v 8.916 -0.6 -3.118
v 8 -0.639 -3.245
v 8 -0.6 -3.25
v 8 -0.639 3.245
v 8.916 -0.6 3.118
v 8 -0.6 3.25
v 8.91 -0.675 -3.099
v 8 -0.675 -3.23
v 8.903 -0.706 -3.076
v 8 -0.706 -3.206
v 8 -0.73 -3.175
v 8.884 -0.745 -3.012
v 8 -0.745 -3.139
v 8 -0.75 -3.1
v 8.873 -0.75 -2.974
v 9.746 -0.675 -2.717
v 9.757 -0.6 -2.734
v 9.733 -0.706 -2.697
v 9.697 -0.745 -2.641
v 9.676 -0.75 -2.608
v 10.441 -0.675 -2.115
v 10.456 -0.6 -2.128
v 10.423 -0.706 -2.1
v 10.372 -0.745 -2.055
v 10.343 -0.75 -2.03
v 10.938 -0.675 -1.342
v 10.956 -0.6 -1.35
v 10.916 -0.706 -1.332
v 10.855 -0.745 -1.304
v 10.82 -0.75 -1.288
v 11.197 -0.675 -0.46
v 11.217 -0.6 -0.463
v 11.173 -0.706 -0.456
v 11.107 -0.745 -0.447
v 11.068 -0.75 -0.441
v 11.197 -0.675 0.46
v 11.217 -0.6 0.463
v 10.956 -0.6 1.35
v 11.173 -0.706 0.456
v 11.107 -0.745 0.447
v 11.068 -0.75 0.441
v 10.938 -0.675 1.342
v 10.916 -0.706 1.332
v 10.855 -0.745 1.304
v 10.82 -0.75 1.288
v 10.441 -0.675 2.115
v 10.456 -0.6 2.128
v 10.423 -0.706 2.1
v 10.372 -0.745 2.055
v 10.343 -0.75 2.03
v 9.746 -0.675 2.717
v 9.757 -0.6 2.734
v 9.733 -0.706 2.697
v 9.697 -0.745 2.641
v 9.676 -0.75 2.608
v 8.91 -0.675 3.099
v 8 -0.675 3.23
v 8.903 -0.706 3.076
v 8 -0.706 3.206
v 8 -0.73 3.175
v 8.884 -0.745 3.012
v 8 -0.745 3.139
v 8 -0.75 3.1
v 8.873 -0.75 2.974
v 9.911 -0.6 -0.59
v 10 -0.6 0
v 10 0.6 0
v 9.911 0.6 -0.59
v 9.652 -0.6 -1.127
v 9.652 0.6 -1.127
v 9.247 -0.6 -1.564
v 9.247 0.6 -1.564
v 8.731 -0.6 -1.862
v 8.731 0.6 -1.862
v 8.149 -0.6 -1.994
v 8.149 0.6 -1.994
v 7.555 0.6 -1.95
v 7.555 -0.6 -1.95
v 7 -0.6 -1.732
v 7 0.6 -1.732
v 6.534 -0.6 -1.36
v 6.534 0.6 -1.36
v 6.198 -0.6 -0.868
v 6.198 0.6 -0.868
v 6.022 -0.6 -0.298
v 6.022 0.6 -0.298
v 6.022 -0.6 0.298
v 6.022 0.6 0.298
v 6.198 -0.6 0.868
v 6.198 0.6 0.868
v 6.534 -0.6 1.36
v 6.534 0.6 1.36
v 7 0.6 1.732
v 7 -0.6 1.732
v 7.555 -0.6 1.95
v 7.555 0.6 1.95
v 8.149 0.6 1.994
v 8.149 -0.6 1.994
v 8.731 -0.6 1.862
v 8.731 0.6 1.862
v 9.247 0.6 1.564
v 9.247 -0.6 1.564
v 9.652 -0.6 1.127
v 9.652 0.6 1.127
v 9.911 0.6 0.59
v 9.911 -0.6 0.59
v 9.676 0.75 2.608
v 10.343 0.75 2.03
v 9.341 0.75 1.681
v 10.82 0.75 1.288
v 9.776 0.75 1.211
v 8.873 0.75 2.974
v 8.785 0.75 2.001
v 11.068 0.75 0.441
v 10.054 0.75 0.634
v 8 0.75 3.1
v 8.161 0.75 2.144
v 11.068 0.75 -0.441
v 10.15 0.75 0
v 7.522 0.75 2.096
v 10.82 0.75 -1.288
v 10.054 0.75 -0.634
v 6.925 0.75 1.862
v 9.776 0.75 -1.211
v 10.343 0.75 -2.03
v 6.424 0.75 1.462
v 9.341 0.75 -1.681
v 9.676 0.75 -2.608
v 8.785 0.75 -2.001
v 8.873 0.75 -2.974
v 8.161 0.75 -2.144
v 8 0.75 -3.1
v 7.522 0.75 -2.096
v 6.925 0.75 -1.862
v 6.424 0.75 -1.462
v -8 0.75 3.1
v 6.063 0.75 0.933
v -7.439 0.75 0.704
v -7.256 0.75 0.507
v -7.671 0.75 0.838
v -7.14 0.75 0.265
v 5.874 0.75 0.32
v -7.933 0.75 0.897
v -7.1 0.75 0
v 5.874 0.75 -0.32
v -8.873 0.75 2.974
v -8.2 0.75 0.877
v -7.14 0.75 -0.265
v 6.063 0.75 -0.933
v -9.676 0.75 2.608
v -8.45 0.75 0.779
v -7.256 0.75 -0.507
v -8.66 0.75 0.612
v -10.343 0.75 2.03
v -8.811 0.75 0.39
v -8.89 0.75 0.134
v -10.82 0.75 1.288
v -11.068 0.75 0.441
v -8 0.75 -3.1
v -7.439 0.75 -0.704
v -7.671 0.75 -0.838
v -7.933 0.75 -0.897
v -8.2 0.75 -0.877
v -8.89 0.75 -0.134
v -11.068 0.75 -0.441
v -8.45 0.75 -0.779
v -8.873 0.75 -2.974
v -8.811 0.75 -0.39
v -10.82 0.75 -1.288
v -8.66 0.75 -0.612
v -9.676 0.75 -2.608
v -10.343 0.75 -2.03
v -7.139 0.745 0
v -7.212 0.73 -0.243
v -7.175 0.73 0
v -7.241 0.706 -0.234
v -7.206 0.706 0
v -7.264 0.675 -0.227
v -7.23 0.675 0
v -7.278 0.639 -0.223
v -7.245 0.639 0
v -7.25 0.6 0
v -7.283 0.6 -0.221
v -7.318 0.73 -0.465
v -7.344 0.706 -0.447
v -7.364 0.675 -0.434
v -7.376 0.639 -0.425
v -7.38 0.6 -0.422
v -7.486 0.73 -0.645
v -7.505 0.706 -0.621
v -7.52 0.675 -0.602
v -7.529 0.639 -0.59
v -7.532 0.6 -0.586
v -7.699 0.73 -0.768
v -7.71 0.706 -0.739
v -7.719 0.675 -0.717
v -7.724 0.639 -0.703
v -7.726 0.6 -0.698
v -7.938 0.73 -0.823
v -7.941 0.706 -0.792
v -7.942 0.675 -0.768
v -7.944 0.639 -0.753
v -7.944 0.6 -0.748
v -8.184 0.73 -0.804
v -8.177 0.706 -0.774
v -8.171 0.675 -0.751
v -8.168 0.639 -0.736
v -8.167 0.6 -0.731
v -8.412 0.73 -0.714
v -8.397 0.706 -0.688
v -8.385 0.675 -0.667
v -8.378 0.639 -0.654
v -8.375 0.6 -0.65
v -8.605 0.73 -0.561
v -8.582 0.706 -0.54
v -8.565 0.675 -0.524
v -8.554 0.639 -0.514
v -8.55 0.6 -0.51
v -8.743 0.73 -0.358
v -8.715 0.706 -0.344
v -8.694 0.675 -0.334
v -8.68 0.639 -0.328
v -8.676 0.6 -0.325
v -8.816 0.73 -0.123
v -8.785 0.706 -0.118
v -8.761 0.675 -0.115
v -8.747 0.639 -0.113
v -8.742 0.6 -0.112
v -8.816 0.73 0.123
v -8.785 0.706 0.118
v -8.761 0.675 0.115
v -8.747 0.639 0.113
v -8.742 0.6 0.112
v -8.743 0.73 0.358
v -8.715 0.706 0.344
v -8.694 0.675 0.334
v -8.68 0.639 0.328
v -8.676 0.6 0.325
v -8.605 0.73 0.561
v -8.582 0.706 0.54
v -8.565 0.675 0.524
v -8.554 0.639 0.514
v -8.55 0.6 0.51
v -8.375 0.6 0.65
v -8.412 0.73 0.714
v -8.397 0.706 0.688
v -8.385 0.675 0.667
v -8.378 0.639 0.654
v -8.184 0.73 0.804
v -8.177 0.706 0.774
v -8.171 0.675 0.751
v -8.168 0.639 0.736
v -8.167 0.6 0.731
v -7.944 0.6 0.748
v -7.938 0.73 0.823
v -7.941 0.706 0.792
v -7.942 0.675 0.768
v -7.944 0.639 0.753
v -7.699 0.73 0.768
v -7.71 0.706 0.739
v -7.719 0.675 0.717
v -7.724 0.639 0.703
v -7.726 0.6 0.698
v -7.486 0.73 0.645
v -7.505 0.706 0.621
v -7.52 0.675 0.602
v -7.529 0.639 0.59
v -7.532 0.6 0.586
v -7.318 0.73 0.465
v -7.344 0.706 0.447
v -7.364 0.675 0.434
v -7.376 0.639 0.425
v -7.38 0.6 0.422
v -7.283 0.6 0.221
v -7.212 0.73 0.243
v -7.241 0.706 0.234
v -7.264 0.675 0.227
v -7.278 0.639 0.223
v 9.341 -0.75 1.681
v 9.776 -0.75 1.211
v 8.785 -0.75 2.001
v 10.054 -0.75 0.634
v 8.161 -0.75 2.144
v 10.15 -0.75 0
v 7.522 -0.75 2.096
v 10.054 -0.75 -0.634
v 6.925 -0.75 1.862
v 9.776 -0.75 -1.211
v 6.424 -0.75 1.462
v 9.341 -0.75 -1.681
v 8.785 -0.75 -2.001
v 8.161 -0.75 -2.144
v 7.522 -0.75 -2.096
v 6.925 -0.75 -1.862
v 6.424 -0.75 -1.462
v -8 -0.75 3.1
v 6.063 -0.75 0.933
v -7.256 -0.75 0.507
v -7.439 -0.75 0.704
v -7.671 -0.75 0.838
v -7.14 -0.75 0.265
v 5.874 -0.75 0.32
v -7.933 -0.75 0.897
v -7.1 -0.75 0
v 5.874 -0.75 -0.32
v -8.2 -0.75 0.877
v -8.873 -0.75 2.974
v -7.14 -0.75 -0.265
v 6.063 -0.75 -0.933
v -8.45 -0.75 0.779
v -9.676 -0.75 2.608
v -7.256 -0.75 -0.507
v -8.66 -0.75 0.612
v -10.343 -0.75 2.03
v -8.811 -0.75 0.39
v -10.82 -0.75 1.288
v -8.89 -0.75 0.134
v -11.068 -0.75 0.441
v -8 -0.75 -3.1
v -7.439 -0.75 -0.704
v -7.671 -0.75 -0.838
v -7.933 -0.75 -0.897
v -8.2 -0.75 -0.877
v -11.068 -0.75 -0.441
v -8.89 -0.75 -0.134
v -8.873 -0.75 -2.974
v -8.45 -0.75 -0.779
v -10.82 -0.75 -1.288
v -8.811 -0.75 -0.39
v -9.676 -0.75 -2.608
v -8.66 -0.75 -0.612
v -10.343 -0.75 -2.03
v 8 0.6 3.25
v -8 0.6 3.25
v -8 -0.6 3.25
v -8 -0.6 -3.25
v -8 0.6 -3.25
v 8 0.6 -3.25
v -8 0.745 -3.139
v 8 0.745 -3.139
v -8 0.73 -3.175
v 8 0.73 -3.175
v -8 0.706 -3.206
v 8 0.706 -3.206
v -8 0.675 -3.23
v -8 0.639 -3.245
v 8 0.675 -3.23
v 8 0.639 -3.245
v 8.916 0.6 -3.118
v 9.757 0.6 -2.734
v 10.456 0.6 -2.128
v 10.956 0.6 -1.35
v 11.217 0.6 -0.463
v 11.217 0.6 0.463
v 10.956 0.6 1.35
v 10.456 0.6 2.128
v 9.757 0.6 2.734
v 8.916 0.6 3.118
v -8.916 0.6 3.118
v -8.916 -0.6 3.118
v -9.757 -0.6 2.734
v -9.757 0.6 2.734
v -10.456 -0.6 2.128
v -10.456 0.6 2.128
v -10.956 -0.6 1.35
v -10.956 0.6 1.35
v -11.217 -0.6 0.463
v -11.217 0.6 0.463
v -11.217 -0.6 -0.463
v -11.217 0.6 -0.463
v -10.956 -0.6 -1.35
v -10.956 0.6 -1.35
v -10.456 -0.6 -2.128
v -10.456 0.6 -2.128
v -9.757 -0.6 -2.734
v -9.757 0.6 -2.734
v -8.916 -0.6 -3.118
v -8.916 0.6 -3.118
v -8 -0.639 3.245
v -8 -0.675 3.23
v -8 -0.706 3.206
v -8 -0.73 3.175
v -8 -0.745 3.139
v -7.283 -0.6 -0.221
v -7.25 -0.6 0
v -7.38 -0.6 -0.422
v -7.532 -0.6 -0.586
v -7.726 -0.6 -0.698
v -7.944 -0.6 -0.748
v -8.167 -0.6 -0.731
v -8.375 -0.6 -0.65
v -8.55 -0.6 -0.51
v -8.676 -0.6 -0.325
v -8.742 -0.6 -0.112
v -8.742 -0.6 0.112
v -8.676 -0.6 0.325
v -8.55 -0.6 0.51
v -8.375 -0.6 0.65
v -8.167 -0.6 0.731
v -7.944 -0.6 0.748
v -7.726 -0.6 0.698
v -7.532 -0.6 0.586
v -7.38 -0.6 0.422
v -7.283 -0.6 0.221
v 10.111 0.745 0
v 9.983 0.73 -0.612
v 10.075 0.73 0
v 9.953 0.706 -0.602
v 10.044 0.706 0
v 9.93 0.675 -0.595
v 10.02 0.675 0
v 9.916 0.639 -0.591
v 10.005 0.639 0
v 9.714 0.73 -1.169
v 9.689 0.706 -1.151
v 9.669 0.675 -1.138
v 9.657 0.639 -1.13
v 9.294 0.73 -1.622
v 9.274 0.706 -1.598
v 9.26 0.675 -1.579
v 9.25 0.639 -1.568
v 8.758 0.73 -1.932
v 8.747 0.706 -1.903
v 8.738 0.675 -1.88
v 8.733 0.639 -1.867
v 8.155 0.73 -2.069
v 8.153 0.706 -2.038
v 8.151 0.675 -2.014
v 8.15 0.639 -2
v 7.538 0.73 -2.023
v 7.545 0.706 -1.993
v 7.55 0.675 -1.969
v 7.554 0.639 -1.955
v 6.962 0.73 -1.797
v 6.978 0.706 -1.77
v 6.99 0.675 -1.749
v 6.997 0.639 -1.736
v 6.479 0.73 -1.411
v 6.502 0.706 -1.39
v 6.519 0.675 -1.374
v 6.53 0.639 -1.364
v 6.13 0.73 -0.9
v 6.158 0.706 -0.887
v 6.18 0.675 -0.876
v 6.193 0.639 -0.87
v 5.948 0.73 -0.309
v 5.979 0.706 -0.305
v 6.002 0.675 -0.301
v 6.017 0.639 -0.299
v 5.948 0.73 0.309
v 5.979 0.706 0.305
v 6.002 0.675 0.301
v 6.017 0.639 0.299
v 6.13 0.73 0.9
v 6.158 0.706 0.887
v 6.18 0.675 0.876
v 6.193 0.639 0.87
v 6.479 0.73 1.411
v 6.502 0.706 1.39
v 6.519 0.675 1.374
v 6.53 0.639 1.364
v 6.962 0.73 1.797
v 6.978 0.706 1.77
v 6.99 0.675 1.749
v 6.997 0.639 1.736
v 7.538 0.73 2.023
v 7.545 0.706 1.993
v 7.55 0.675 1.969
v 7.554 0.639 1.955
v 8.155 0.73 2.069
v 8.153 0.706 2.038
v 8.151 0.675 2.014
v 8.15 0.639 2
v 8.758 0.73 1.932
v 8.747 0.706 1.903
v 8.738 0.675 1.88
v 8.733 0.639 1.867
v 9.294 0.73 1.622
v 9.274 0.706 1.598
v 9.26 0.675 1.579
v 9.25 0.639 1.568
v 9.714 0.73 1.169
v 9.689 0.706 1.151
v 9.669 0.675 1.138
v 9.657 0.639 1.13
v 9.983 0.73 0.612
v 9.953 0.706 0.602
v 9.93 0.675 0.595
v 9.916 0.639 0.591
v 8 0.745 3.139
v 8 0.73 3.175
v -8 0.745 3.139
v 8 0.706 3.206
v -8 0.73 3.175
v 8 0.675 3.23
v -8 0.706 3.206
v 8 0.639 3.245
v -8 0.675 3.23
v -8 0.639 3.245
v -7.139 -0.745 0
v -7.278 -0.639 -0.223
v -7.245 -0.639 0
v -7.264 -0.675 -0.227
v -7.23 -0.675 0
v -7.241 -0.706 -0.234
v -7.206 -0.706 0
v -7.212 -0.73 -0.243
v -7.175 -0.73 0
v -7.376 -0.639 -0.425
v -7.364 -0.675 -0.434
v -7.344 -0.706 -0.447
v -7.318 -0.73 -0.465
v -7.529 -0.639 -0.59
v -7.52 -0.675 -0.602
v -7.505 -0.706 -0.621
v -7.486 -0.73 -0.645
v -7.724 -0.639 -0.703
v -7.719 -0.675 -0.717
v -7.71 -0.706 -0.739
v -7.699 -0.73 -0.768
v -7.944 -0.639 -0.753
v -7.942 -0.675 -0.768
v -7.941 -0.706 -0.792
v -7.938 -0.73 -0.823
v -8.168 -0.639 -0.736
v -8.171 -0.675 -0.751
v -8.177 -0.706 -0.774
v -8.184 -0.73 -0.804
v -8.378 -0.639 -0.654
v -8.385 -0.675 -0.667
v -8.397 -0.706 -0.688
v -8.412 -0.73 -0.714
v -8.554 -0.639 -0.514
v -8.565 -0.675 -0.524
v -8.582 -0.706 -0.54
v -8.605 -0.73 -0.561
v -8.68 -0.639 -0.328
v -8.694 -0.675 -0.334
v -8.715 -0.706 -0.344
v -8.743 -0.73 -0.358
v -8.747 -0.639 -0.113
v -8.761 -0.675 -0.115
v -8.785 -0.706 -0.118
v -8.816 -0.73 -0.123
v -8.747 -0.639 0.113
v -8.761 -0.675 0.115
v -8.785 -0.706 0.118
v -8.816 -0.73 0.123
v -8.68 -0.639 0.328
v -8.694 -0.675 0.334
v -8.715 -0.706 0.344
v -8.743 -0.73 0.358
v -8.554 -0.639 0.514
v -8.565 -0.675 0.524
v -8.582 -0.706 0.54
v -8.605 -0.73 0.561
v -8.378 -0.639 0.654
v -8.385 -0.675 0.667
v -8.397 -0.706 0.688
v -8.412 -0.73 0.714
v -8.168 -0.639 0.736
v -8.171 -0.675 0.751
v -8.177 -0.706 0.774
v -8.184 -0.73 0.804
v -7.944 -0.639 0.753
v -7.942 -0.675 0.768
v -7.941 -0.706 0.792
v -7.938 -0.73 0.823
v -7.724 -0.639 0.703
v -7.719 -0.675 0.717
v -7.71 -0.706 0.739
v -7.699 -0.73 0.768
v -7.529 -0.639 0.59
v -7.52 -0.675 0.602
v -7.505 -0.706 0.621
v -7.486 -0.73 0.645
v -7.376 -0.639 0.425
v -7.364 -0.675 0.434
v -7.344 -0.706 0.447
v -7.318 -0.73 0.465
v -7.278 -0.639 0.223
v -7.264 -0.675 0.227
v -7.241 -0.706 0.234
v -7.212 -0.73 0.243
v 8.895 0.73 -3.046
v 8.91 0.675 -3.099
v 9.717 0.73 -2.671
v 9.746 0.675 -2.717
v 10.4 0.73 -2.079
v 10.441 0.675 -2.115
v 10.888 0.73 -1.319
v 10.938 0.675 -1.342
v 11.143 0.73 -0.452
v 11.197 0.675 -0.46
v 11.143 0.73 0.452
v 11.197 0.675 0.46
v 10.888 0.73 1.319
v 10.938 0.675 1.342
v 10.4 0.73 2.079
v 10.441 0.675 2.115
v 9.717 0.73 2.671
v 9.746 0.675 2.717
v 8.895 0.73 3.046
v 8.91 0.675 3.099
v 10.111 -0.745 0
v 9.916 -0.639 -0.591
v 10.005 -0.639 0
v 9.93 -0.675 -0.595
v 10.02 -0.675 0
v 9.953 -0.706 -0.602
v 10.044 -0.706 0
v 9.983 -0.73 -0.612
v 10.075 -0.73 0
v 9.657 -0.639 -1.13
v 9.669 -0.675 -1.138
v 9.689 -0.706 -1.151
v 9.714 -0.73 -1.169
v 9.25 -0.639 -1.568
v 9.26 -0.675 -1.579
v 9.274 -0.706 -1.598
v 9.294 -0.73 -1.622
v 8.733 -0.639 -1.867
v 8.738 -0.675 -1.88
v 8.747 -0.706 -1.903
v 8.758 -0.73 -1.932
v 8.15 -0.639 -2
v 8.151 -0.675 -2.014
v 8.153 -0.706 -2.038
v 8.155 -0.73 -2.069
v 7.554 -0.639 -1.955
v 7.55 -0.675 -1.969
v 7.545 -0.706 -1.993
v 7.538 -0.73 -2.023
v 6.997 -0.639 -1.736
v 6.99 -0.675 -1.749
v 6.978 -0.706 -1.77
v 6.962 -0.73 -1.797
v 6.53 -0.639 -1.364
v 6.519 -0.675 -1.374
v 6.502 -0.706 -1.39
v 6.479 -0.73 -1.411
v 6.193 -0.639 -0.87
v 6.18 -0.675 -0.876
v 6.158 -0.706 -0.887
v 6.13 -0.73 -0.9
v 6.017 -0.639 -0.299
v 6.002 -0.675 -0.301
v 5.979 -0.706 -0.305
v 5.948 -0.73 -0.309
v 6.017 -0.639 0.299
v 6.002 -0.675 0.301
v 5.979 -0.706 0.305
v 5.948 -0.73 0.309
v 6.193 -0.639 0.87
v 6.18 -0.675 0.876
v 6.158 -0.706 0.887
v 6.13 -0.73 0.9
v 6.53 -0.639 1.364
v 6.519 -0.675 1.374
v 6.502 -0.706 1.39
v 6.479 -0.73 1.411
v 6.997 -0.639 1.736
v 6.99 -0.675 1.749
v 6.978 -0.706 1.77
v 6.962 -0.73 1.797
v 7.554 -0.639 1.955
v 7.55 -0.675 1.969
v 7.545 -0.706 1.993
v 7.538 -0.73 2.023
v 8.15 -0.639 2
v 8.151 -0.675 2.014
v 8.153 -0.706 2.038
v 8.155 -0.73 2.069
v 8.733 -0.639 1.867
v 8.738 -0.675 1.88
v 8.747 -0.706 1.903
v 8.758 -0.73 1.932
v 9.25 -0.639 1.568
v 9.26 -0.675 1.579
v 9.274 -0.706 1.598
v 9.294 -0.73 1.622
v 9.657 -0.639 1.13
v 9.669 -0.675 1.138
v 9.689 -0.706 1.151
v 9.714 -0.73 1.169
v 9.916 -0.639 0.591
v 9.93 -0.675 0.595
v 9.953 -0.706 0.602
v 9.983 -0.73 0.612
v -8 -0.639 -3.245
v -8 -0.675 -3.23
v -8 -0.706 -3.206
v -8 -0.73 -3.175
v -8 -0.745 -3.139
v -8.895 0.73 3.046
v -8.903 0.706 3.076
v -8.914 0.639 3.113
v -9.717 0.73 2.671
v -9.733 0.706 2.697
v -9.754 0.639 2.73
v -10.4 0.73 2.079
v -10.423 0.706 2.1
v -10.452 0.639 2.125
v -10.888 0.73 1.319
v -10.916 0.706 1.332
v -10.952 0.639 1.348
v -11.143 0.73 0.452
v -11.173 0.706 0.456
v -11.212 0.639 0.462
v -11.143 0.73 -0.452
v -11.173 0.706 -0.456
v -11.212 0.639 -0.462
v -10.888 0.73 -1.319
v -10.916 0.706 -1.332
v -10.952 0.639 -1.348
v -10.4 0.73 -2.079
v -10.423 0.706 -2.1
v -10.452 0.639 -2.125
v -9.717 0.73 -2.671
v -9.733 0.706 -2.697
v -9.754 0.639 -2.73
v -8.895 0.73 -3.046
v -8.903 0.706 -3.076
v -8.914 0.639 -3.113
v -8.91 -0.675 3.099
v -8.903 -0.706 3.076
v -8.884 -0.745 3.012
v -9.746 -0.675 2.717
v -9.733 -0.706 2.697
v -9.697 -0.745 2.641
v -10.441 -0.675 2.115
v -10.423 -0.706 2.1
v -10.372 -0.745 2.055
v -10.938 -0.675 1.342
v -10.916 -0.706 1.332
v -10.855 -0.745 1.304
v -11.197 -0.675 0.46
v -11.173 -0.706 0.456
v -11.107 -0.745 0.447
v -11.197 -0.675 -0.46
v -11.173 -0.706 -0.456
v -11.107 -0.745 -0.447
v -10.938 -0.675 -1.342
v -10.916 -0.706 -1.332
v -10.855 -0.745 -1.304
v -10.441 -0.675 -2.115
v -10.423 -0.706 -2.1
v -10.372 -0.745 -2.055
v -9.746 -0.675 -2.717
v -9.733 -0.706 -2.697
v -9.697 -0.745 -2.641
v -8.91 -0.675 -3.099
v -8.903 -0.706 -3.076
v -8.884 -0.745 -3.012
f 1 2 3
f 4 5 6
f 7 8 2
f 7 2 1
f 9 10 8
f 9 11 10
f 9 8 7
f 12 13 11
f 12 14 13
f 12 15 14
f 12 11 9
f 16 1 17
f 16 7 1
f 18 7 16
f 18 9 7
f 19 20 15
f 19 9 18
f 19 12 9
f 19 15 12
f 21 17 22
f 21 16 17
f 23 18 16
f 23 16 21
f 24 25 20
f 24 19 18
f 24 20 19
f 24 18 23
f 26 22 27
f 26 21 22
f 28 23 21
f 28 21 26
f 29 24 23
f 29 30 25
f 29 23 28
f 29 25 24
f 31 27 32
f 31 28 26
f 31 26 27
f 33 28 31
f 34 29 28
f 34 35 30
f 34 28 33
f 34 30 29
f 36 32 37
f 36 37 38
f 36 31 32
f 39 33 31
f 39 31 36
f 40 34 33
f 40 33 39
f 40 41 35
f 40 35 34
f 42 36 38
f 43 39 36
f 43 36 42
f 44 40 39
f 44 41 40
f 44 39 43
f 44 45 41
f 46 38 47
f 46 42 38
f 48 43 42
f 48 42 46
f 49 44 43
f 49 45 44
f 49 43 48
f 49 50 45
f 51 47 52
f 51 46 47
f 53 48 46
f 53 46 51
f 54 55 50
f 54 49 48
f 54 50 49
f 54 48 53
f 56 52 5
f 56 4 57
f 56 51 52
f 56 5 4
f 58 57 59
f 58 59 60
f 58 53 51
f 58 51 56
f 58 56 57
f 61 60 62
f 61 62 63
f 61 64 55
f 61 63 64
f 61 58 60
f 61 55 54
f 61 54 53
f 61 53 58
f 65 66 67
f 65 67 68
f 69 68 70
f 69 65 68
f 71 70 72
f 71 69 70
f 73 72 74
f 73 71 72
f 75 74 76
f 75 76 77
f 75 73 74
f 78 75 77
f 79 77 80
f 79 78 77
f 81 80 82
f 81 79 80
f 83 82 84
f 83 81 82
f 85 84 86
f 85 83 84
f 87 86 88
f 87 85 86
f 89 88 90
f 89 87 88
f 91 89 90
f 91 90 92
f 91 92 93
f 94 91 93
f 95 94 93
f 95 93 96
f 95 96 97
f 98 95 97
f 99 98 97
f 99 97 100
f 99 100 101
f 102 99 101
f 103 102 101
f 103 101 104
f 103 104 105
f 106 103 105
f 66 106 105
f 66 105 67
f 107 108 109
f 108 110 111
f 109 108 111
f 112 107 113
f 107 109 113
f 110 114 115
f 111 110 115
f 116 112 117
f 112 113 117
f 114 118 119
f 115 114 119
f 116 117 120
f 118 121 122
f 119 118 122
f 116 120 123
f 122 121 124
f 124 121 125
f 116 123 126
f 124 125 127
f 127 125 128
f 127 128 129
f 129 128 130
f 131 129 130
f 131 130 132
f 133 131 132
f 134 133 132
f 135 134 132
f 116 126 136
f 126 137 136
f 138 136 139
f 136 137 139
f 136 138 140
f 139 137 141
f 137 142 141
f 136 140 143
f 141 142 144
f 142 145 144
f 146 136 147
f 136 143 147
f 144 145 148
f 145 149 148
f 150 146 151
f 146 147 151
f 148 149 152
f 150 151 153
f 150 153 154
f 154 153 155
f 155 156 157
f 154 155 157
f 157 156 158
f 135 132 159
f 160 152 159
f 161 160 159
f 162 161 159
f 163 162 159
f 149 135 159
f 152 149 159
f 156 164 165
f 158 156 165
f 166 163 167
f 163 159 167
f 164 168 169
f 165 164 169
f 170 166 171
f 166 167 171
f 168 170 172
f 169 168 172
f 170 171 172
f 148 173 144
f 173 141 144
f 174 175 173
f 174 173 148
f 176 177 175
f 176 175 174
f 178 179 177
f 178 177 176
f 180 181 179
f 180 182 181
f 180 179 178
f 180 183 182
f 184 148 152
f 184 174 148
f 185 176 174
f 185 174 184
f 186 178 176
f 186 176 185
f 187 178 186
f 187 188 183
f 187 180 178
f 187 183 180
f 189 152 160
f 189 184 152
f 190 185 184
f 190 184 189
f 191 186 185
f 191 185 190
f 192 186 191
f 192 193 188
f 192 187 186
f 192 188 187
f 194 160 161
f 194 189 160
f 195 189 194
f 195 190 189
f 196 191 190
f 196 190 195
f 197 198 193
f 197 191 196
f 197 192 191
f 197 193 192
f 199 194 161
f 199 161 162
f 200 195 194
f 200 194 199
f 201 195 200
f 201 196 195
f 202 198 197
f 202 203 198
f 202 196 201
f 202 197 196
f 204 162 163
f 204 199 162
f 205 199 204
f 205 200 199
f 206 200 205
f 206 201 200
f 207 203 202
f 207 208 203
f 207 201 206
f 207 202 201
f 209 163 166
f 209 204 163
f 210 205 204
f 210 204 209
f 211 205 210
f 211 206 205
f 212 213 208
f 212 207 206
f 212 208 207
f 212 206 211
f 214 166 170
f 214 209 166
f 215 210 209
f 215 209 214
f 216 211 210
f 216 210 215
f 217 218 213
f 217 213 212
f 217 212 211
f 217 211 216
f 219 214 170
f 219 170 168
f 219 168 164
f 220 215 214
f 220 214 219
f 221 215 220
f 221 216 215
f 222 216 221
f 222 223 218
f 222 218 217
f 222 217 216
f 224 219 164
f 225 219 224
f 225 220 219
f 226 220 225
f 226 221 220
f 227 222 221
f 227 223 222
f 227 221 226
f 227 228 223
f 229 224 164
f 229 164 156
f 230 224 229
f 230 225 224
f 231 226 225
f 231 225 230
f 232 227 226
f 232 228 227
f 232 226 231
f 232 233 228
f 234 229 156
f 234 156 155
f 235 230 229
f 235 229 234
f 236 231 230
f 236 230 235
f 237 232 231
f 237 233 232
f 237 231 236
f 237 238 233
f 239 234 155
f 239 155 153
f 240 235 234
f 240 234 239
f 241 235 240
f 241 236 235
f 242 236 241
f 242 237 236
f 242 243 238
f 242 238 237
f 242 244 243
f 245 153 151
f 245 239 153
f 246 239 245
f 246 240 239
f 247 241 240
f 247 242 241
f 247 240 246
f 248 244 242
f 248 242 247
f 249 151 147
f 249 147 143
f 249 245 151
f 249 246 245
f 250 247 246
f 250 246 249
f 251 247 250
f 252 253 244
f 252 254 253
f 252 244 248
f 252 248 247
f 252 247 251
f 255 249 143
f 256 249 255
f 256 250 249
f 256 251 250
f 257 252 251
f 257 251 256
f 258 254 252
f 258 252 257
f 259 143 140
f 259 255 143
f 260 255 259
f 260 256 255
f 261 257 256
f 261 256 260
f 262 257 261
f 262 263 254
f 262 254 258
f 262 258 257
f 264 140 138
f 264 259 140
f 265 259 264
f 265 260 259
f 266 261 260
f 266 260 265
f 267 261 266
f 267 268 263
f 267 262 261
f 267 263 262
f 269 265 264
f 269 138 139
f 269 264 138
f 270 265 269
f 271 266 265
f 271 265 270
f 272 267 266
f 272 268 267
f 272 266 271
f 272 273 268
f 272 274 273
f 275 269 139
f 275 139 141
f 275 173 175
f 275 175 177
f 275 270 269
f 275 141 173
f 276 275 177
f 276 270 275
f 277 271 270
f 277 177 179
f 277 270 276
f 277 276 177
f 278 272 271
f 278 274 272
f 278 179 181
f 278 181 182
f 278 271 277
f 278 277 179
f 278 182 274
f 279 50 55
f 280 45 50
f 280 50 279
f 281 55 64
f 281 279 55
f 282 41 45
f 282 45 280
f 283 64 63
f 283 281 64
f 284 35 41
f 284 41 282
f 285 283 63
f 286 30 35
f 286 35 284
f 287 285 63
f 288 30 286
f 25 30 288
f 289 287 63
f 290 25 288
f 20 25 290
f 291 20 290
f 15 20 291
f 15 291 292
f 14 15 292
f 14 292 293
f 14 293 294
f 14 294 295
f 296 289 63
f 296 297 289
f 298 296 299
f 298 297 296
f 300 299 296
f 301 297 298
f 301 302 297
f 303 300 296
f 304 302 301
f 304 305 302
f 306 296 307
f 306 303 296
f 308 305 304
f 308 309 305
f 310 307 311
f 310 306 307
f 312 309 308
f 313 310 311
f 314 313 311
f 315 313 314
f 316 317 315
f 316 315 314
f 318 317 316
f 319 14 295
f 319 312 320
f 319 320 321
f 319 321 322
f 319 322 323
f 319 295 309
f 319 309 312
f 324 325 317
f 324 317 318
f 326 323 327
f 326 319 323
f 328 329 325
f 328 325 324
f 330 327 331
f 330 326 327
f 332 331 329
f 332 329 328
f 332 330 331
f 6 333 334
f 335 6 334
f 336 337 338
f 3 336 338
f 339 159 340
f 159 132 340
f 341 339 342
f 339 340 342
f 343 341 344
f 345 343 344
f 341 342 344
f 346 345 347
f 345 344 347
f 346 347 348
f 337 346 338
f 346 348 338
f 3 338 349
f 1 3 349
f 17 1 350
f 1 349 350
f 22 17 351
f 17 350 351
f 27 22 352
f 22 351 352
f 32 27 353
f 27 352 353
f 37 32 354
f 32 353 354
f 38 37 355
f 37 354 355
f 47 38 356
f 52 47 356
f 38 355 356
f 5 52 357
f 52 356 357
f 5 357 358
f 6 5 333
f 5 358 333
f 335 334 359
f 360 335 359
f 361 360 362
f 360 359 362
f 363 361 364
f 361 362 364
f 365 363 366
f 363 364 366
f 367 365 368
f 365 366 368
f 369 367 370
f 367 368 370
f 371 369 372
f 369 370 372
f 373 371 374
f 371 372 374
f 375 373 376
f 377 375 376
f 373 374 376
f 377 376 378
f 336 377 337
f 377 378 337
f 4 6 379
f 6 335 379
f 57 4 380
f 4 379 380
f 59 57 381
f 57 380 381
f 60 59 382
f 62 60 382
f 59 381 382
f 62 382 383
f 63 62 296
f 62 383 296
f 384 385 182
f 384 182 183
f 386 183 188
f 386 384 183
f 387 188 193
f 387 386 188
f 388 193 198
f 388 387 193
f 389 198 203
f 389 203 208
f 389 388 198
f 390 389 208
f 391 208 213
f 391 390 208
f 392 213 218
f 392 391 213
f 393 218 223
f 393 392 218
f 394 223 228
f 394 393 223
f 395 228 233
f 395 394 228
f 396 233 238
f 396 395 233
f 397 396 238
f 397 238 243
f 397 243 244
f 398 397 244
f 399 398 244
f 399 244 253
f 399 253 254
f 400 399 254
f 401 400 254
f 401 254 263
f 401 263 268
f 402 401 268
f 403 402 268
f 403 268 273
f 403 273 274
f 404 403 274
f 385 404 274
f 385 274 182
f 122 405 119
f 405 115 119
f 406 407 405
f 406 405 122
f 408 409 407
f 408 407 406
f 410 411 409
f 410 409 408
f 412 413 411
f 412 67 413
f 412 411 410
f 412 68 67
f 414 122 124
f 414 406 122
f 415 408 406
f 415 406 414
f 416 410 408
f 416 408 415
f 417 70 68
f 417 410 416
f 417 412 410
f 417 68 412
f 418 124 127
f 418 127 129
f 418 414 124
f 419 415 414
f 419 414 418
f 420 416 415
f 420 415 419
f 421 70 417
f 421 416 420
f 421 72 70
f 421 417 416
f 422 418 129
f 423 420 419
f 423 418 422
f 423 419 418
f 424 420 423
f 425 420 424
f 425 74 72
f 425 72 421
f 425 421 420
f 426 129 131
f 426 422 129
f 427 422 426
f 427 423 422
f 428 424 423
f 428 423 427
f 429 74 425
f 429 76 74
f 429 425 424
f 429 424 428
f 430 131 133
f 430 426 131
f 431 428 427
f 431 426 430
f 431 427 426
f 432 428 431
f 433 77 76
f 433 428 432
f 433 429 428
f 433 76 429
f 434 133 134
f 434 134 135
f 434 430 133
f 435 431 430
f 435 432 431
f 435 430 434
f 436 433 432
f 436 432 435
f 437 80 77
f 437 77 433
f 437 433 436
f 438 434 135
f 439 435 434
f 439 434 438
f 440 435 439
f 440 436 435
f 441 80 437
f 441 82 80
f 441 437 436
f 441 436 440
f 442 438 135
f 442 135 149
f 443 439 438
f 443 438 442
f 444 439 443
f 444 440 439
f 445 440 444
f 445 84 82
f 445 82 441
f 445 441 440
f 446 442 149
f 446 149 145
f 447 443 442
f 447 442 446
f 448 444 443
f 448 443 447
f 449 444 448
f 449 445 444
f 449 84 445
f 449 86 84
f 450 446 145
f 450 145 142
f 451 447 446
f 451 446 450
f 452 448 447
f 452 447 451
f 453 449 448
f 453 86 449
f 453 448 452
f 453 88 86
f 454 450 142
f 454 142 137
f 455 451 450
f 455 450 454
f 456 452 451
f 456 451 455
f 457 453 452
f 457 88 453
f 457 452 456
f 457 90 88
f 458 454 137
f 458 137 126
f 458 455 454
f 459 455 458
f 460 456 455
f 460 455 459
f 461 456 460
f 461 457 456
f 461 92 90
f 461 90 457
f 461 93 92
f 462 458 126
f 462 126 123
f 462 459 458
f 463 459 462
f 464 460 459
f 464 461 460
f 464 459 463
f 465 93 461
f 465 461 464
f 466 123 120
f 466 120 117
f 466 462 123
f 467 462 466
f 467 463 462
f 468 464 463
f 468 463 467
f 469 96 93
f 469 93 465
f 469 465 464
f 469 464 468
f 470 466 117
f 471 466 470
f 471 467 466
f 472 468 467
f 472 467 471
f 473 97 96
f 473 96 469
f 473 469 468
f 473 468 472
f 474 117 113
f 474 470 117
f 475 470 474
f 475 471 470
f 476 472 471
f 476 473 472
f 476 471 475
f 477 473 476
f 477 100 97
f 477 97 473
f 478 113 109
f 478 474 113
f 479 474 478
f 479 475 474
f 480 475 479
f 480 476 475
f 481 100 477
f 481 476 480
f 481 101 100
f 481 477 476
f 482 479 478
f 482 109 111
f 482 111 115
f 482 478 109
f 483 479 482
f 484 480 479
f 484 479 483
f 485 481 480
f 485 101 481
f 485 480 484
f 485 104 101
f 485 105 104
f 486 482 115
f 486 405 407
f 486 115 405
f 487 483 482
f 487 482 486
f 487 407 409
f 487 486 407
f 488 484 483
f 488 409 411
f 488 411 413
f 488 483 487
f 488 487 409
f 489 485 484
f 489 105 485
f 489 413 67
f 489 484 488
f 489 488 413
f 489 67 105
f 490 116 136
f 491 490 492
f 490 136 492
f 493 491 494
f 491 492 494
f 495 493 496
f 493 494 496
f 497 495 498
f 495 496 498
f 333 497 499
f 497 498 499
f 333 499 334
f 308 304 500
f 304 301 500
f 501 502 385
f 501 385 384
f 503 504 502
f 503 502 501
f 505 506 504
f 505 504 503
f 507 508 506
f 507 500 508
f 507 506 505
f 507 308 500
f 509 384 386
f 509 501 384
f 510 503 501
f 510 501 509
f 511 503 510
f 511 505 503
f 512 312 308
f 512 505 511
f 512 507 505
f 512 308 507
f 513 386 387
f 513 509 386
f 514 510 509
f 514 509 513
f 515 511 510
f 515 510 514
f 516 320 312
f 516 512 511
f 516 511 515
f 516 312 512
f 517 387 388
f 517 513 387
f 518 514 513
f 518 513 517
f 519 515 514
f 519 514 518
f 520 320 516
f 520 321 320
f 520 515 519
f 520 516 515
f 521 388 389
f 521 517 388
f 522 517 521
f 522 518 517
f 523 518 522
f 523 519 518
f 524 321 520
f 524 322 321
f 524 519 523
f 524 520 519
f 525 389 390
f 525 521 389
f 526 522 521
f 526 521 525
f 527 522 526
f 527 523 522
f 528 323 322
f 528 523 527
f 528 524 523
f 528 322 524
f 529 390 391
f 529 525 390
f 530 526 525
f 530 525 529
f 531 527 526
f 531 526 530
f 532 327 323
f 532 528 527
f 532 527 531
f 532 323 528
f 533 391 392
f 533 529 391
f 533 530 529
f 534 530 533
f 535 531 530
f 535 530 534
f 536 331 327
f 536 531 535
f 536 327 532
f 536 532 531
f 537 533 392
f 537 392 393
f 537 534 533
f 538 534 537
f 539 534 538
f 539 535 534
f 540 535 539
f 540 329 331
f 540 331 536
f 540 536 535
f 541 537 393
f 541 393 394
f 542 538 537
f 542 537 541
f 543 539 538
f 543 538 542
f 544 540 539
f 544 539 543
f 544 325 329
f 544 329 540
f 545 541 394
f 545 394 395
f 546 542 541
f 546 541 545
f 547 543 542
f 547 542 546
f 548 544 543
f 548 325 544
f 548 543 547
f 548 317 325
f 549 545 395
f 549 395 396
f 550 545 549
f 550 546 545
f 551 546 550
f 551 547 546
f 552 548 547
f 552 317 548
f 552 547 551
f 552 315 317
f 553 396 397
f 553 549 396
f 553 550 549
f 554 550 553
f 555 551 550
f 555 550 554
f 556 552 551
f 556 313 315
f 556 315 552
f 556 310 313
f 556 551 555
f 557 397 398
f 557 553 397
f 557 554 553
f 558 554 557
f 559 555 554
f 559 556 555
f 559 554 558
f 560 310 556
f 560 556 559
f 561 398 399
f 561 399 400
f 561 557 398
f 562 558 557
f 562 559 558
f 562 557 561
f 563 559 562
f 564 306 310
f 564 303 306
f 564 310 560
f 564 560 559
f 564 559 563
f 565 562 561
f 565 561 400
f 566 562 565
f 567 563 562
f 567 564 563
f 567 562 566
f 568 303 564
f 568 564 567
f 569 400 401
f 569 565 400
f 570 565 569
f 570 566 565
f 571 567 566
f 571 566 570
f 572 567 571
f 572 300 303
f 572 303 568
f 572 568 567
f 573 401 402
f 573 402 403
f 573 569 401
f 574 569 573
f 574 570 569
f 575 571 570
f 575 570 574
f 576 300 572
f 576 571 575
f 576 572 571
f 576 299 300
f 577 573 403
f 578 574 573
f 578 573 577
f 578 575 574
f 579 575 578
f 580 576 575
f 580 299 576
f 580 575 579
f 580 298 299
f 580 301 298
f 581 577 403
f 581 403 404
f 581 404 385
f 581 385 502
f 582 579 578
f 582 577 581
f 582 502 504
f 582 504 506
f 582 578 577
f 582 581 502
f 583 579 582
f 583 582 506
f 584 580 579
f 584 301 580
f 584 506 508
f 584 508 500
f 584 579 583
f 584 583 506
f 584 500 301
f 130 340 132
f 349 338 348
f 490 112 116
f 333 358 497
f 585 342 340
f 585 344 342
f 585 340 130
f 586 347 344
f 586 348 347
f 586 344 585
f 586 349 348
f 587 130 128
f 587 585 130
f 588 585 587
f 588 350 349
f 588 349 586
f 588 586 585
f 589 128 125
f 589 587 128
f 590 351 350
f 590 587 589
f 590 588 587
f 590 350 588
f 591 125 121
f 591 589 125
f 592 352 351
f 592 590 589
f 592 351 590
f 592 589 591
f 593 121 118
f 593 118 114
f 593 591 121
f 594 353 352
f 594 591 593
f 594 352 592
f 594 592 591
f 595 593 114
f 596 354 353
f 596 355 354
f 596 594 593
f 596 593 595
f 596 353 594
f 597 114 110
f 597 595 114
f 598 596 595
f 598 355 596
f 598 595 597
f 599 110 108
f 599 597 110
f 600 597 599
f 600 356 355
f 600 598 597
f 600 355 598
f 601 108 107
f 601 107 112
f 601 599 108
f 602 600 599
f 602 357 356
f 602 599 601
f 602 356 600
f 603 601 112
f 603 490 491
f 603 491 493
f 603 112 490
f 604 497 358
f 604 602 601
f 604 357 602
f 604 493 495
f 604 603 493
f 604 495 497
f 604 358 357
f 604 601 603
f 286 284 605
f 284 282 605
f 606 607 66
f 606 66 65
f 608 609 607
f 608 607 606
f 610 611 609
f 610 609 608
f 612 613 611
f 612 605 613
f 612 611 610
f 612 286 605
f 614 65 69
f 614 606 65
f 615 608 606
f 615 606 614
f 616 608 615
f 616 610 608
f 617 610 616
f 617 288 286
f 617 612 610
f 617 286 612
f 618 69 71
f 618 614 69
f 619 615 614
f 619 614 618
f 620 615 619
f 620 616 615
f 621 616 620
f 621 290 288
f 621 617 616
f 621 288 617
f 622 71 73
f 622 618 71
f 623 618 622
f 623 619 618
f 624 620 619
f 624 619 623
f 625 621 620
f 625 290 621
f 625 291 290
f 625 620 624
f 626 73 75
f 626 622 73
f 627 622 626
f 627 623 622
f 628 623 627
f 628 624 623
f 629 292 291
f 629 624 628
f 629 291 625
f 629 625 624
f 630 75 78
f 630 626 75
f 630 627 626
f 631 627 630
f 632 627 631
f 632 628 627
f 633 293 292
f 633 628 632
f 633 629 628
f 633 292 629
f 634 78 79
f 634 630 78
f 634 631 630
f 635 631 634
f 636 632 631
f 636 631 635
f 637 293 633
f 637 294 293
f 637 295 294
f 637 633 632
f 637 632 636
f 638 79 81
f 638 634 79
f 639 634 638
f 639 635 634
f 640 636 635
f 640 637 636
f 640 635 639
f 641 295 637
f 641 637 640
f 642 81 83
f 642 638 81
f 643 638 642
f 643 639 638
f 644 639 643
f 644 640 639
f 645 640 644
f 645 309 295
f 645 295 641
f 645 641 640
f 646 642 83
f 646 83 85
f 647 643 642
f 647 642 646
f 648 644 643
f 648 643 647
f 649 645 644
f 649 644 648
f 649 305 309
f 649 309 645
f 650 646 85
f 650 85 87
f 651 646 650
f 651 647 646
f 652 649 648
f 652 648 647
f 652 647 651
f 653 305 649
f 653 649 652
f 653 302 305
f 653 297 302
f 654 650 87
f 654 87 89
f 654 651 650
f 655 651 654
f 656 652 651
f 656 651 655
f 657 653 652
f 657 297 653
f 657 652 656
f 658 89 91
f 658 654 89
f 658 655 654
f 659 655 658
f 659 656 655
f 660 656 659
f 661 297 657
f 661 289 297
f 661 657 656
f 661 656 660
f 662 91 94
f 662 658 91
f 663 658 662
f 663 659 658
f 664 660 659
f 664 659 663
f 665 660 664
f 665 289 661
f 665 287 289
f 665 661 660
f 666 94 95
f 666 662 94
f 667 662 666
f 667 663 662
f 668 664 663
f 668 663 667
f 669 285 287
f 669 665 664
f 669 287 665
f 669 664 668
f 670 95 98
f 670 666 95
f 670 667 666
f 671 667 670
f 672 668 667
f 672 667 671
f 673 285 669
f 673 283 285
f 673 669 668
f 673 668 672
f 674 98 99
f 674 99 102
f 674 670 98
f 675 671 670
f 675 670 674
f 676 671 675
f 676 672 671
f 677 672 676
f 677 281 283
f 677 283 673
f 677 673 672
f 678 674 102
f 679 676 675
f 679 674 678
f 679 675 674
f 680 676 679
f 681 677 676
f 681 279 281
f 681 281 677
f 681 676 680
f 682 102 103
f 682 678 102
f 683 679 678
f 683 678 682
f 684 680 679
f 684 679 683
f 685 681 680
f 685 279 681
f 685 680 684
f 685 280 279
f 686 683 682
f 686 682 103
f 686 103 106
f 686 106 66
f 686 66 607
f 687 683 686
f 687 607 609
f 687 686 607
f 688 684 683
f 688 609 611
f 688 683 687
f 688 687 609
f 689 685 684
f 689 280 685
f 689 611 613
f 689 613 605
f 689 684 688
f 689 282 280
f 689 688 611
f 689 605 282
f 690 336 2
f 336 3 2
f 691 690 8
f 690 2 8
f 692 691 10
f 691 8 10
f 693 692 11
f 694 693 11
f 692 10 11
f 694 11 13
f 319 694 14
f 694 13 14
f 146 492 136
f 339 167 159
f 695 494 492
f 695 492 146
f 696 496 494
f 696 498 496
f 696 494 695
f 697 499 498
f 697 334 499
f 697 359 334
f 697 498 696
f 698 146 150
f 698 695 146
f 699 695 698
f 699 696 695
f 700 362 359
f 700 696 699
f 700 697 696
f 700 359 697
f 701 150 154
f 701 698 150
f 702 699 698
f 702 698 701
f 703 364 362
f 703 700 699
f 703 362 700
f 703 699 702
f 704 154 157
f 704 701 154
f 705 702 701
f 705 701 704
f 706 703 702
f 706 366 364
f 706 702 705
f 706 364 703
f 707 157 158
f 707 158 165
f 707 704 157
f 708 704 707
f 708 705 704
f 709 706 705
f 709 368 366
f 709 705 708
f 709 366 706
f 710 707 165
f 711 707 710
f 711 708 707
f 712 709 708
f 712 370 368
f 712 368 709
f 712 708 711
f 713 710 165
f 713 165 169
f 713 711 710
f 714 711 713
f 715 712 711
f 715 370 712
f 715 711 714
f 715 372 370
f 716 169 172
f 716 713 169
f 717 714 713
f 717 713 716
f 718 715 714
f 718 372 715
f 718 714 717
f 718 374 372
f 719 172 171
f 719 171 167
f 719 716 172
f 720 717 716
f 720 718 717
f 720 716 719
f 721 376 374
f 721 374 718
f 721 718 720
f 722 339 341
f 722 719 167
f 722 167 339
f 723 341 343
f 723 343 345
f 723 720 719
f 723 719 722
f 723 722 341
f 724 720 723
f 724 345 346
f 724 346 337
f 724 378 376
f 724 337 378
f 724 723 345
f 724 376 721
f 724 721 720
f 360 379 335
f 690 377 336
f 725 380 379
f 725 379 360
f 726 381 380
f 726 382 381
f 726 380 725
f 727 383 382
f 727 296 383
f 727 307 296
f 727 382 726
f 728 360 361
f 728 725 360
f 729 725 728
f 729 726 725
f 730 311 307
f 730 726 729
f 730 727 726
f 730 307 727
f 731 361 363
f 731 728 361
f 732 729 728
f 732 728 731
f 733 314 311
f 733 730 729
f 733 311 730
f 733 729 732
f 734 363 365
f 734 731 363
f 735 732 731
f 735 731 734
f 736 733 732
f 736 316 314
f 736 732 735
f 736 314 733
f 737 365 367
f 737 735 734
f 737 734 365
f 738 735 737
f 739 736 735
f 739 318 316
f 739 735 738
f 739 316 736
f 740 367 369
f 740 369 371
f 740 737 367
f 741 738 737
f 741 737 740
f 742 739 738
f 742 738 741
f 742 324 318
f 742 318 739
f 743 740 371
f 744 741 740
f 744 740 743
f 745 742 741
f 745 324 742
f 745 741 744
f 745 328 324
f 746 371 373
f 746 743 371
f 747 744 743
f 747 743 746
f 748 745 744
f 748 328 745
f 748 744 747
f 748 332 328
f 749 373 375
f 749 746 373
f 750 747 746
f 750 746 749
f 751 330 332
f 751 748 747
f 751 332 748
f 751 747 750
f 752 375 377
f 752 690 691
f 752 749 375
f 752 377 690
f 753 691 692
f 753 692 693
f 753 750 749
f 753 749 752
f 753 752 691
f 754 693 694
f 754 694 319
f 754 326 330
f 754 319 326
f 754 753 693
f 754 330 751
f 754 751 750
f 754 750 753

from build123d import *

# Parameters (mm, degrees)
SKETCH1_R           = 0.75
SKETCH1_R_2         = 2
BOSS_EXTRUDE1_DEPTH = 0.75
FILLET1_R           = 0.15


with BuildPart() as part:
    # Sketch1 → Boss-Extrude1 (new body, symmetric)
    with BuildSketch(Plane(origin=(0, 0, 0), x_dir=(1, 0, 0), z_dir=(0, 1, 0))):
        with BuildLine():
            Line((-8, 3.25), (8, 3.25))
            ThreePointArc((8, 3.25), (11.25, 0), (8, -3.25))
            Line((8, -3.25), (-8, -3.25))
            ThreePointArc((-8, -3.25), (-11.25, 0), (-8, 3.25))
        make_face()
        with Locations((-8, 0)):
            Circle(SKETCH1_R, mode=Mode.SUBTRACT)
        with Locations((8, 0)):
            Circle(SKETCH1_R_2, mode=Mode.SUBTRACT)
    extrude(amount=BOSS_EXTRUDE1_DEPTH, both=True)

    # Fillet1
    fillet1_edges = [part.edges().sort_by_distance(p)[0] for p in [
        (11.25, 0.75, 0),
        (-8.75, -0.75, 0),
        (-8.75, 0.75, 0),
        (0, 0.75, -3.25),
        (6, -0.75, 0),
        (6, 0.75, 0),
        (-11.25, 0.75, 0),
        (0, -0.75, -3.25),
        (11.25, -0.75, 0),
        (0, -0.75, 3.25),
        (-11.25, -0.75, 0),
        (0, 0.75, 3.25),
    ]]
    fillet(fillet1_edges, radius=FILLET1_R)


solid = part.part
